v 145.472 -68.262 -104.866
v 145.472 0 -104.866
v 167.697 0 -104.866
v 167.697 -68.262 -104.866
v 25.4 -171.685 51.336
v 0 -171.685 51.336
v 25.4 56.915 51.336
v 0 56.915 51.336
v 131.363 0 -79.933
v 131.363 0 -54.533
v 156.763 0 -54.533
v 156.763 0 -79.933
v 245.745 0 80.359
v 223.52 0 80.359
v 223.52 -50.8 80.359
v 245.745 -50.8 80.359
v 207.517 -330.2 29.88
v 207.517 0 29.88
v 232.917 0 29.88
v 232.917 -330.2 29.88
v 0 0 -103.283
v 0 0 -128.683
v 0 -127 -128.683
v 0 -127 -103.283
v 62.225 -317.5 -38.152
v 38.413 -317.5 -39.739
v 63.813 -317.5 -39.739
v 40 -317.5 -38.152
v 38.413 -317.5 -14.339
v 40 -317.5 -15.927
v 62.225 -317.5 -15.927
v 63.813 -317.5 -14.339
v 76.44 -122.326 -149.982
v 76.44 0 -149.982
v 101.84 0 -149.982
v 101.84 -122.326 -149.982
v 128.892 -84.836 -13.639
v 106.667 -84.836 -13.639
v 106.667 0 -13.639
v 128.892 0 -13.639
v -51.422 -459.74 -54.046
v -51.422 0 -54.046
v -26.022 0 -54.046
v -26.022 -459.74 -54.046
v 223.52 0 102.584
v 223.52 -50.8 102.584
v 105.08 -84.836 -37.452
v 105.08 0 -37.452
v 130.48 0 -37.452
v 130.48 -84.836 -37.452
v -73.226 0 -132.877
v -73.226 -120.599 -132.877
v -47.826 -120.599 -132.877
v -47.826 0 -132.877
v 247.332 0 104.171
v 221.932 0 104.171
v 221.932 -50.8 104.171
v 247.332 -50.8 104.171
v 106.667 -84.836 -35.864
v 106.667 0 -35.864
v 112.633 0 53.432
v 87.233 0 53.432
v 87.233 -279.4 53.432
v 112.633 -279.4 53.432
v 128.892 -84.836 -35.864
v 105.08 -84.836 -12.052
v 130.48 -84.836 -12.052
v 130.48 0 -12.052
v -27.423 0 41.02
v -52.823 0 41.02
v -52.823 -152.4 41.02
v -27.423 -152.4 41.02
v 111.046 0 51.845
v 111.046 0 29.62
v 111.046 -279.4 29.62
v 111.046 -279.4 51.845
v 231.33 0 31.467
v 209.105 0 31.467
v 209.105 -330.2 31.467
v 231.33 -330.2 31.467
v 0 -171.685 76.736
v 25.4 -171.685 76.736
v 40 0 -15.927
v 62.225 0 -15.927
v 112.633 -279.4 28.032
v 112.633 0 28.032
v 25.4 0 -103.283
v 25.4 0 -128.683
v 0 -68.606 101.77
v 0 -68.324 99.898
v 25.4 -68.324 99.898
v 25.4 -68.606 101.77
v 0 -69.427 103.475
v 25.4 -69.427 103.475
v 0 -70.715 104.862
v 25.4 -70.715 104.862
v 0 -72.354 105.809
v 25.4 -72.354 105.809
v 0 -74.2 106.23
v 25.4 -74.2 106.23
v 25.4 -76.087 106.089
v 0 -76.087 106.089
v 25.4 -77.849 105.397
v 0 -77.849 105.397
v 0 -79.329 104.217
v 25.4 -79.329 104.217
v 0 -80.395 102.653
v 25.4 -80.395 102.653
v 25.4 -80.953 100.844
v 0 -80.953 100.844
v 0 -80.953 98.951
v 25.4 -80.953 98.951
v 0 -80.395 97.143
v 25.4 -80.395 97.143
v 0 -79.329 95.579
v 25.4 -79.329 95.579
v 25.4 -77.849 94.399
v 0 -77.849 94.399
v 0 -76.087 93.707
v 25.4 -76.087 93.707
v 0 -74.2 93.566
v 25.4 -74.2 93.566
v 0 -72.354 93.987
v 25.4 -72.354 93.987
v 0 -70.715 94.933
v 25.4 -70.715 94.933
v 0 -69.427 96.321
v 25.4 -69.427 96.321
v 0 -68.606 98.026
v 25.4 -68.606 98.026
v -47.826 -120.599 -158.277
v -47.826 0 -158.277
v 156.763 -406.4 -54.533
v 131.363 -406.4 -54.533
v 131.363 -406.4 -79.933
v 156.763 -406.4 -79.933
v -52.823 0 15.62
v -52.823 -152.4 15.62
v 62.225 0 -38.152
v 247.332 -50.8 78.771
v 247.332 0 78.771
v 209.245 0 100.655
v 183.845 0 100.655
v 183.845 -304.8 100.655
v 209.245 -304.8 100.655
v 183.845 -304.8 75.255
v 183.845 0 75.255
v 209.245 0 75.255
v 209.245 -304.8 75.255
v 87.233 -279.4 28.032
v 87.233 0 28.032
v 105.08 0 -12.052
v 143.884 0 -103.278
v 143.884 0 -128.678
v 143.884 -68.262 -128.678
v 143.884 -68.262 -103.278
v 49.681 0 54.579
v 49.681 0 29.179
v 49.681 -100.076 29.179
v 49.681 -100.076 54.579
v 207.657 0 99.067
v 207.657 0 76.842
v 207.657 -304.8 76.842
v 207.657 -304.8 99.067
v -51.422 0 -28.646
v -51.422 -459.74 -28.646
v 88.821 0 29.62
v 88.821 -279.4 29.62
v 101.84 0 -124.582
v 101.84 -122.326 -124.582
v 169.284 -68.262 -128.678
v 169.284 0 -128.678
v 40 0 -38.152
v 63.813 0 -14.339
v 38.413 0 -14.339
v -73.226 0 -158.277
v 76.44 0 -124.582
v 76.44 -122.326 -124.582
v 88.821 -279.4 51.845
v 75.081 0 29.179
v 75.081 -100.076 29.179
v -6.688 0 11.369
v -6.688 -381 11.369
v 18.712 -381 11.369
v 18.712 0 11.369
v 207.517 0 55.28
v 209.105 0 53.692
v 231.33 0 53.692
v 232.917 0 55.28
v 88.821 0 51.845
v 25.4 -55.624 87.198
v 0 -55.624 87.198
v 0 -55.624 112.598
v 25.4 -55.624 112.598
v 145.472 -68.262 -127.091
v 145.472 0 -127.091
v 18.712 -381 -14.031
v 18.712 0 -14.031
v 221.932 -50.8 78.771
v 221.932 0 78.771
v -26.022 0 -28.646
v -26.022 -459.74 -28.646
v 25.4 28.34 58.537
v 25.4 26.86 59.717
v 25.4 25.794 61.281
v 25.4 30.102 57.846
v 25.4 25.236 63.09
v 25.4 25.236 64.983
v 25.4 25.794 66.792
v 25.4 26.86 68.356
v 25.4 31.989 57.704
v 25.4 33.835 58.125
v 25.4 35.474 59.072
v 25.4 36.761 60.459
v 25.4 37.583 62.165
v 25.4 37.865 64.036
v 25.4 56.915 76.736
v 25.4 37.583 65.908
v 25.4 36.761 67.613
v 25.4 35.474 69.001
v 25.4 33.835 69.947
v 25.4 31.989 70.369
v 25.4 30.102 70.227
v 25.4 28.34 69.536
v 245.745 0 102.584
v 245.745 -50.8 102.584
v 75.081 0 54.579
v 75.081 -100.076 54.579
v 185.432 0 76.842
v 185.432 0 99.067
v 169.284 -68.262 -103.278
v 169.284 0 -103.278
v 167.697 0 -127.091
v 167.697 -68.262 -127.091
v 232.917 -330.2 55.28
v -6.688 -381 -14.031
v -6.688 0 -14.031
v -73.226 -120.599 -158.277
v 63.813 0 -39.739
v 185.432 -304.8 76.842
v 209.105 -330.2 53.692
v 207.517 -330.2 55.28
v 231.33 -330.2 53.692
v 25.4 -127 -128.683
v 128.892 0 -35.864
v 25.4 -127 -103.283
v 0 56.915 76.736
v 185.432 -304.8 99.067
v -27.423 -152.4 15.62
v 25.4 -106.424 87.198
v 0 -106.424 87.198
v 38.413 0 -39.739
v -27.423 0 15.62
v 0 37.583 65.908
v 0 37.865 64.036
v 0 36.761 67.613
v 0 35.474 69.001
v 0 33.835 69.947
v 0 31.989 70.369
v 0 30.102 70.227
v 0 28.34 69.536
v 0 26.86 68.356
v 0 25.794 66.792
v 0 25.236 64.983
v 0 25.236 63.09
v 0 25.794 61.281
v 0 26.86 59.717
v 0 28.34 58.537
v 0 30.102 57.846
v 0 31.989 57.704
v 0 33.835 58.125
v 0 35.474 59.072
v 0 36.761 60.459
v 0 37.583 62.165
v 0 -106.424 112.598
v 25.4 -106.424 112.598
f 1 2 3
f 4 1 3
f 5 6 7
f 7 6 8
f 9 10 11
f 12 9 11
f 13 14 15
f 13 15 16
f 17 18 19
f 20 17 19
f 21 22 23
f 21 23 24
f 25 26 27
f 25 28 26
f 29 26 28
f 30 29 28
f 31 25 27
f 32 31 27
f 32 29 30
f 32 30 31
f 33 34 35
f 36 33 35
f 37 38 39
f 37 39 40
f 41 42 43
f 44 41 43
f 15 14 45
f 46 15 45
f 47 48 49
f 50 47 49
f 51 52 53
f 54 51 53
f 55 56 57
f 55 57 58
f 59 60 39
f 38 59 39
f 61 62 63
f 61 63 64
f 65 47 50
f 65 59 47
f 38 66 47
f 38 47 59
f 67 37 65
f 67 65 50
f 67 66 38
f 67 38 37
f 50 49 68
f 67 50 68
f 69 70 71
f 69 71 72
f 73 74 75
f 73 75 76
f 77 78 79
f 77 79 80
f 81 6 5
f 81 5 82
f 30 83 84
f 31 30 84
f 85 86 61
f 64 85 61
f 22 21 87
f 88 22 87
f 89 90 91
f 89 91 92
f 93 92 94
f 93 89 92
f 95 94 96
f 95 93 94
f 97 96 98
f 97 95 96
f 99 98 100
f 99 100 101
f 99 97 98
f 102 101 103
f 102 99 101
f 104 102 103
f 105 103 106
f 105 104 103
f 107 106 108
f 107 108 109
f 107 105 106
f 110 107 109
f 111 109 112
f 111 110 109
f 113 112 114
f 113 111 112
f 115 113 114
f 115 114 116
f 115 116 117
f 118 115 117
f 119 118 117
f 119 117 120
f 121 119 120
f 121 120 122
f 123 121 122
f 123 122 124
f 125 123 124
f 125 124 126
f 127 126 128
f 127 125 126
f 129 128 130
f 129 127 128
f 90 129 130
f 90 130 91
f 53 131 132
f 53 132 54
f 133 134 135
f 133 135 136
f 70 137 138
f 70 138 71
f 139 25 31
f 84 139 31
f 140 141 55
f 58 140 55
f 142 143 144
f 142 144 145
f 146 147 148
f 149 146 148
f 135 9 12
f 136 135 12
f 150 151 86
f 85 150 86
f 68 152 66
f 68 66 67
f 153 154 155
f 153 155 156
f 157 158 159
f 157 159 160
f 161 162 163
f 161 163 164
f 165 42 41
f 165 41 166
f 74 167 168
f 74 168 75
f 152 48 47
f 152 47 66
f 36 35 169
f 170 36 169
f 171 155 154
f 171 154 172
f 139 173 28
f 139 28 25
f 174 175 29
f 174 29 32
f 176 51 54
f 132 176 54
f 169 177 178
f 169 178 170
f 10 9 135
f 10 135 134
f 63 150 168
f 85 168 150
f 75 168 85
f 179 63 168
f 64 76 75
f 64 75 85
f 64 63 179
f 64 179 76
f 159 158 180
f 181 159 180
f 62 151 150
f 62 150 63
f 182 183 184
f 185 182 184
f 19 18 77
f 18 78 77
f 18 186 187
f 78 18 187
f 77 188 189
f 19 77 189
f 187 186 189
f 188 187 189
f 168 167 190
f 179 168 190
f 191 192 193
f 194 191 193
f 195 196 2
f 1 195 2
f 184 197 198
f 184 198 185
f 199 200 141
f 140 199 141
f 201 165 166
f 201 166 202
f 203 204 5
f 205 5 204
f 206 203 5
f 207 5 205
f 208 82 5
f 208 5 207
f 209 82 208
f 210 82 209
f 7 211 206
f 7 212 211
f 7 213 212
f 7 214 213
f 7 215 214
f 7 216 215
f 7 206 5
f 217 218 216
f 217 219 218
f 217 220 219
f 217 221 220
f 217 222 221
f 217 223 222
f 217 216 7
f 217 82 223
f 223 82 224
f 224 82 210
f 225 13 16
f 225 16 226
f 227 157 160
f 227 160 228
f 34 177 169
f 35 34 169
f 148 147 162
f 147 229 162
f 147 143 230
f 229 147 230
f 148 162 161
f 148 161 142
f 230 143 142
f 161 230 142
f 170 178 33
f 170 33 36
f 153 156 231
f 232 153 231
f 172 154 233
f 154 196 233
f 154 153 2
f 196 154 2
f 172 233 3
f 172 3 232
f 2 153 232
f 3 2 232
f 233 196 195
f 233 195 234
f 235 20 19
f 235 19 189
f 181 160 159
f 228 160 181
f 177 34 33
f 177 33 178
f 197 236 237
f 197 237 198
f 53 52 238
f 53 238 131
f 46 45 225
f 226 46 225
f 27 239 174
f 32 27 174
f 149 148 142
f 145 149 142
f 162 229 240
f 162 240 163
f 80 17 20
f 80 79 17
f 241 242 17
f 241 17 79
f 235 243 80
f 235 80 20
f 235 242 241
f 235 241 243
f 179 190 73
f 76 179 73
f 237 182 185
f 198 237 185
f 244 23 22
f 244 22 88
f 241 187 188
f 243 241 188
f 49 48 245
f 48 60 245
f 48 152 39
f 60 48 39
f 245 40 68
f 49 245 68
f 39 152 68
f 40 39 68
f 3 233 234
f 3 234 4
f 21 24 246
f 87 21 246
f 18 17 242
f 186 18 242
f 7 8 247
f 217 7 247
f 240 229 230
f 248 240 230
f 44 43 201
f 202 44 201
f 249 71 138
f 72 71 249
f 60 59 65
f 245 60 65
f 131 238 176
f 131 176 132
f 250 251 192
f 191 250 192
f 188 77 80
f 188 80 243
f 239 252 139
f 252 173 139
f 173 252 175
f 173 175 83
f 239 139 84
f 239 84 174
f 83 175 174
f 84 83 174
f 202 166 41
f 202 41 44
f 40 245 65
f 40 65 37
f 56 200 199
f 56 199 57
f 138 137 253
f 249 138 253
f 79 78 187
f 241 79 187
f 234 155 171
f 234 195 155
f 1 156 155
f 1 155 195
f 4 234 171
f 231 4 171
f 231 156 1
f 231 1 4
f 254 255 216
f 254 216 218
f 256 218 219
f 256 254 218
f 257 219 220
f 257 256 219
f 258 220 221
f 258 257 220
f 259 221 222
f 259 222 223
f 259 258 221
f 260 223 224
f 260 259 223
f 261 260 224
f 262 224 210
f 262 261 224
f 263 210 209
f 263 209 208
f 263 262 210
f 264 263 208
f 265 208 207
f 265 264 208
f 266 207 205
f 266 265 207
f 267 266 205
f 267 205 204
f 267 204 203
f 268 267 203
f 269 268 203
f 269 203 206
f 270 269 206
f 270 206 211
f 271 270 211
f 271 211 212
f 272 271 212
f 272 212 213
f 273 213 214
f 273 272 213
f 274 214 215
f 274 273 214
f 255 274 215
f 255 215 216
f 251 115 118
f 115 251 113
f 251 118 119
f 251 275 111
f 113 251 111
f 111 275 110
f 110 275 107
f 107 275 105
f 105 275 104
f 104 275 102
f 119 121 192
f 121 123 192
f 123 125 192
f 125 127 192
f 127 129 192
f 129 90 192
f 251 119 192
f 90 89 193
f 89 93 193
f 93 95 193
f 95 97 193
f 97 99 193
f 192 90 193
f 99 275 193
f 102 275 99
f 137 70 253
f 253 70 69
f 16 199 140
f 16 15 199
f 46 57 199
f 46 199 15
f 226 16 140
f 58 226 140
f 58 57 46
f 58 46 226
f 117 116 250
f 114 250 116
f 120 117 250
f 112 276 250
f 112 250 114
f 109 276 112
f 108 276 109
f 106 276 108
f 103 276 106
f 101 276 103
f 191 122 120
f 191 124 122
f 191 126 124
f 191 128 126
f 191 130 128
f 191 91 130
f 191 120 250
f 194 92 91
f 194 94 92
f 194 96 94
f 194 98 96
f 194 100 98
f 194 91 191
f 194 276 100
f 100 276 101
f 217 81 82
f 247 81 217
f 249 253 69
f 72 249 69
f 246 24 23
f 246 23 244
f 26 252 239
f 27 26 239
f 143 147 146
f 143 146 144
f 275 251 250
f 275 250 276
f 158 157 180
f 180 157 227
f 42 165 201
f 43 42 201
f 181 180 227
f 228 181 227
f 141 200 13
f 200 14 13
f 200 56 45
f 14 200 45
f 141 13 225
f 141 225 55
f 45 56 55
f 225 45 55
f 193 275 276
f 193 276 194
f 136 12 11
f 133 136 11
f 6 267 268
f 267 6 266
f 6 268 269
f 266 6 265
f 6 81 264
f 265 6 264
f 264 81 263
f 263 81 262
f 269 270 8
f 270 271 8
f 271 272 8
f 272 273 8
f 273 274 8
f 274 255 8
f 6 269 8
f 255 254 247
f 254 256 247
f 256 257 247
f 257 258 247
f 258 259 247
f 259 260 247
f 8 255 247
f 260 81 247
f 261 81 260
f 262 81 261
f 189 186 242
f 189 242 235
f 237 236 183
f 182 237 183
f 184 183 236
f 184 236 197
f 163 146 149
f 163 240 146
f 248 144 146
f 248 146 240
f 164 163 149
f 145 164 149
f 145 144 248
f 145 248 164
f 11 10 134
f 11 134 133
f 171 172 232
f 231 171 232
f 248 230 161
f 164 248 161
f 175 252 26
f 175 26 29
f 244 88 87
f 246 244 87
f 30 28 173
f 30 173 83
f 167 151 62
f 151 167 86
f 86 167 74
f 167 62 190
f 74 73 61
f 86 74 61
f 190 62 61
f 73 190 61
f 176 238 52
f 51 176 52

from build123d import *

# Parameters (mm, degrees)
F0_W      = 25.4
F0_H      = 25.4
F1_DEPTH  = 381
F2_W      = 25.4
F2_H      = 25.4
F2_W_2    = 22.225
F2_H_2    = 22.225
F3_DEPTH  = 317.5
F4_W      = 25.4
F4_H      = 25.4
F5_DEPTH  = 152.4
F6_W      = 228.6
F6_H      = 25.4
F6_R      = 6.35
F7_DEPTH  = 25.4
F8_W      = 50.8
F8_H      = 25.4
F8_R      = 6.35
F9_DEPTH  = 25.4
F10_W     = 25.4
F10_H     = 25.4
F11_DEPTH = 459.74
F12_W     = 25.4
F12_H     = 25.4
F13_DEPTH = 100.076
F14_W     = 25.4
F14_H     = 25.4
F15_DEPTH = 122.3264
F16_W     = 25.4
F16_H     = 25.4
F17_DEPTH = 120.5992
F18_W     = 25.4
F18_H     = 25.4
F19_DEPTH = 127
F20_W     = 25.4
F20_H     = 25.4
F21_DEPTH = 406.4
F22_W     = 25.4
F22_H     = 25.4
F22_W_2   = 22.225
F22_H_2   = 22.225
F23_DEPTH = 279.4
F24_W     = 25.4
F24_H     = 25.4
F24_W_2   = 22.225
F24_H_2   = 22.225
F25_DEPTH = 304.8
F26_W     = 25.4
F26_H     = 25.4
F26_W_2   = 22.225
F26_H_2   = 22.225
F27_DEPTH = 50.8
F28_W     = 25.4
F28_H     = 25.4
F28_W_2   = 22.225
F28_H_2   = 22.225
F29_DEPTH = 330.2
F30_W     = 25.4
F30_H     = 25.4
F30_W_2   = 22.225
F30_H_2   = 22.225
F31_DEPTH = 84.836
F32_W     = 25.4
F32_H     = 25.4
F32_W_2   = 22.225
F32_H_2   = 22.225
F33_DEPTH = 68.2625


with BuildPart() as f1:
    # F0 (on Front) → F1 (new body)
    with BuildSketch(Plane.XZ):
        with Locations((6.012416, -1.331083)):
            Rectangle(F0_W, F0_H)
    extrude(amount=F1_DEPTH)


with BuildPart() as f3:
    # F2 (on Front) → F3 (new body)
    with BuildSketch(Plane.XZ):
        with Locations((51.112667, -27.039096)):
            Rectangle(F2_W, F2_H)
        with Locations((51.112667, -27.039096)):
            Rectangle(F2_W_2, F2_H_2, mode=Mode.SUBTRACT)
    extrude(amount=F3_DEPTH)


with BuildPart() as f5:
    # F4 (on Front) → F5 (new body)
    with BuildSketch(Plane.XZ):
        with Locations((-40.122539, 28.319776)):
            Rectangle(F4_W, F4_H)
    extrude(amount=F5_DEPTH)


with BuildPart() as f7:
    # F6 (on Right) → F7 (new body)
    with BuildSketch(Plane.YZ):
        with Locations((-57.385214, 64.036405)):
            Rectangle(F6_W, F6_H)
        with Locations((31.514786, 64.036405)):
            Circle(F6_R, mode=Mode.SUBTRACT)
    extrude(amount=F7_DEPTH)


with BuildPart() as f9:
    # F8 (on Right) → F9 (new body)
    with BuildSketch(Plane.YZ):
        with Locations((-81.024057, 99.897847)):
            Rectangle(F8_W, F8_H)
        with Locations((-74.674057, 99.897847)):
            Circle(F8_R, mode=Mode.SUBTRACT)
    extrude(amount=F9_DEPTH)


with BuildPart() as f11:
    # F10 (on Front) → F11 (new body)
    with BuildSketch(Plane.XZ):
        with Locations((-38.722203, -41.346163)):
            Rectangle(F10_W, F10_H)
    extrude(amount=F11_DEPTH)


with BuildPart() as f13:
    # F12 (on Front) → F13 (new body)
    with BuildSketch(Plane.XZ):
        with Locations((62.380522, 41.878674)):
            Rectangle(F12_W, F12_H)
    extrude(amount=F13_DEPTH)


with BuildPart() as f15:
    # F14 (on Front) → F15 (new body)
    with BuildSketch(Plane.XZ):
        with Locations((89.140385, -137.282215)):
            Rectangle(F14_W, F14_H)
    extrude(amount=F15_DEPTH)


with BuildPart() as f17:
    # F16 (on Front) → F17 (new body)
    with BuildSketch(Plane.XZ):
        with Locations((-60.525931, -145.576701)):
            Rectangle(F16_W, F16_H)
    extrude(amount=F17_DEPTH)


with BuildPart() as f19:
    # F18 (on Front) → F19 (new body)
    with BuildSketch(Plane.XZ):
        with Locations((12.7, -115.983012)):
            Rectangle(F18_W, F18_H)
    extrude(amount=F19_DEPTH)


with BuildPart() as f21:
    # F20 (on Front) → F21 (new body)
    with BuildSketch(Plane.XZ):
        with Locations((144.062687, -67.233101)):
            Rectangle(F20_W, F20_H)
    extrude(amount=F21_DEPTH)


with BuildPart() as f23:
    # F22 (on Front) → F23 (new body)
    with BuildSketch(Plane.XZ):
        with Locations((99.933479, 40.732481)):
            Rectangle(F22_W, F22_H)
        with Locations((99.933479, 40.732481)):
            Rectangle(F22_W_2, F22_H_2, mode=Mode.SUBTRACT)
    extrude(amount=F23_DEPTH)


with BuildPart() as f25:
    # F24 (on Front) → F25 (new body)
    with BuildSketch(Plane.XZ):
        with Locations((196.544535, 87.954864)):
            Rectangle(F24_W, F24_H)
        with Locations((196.544535, 87.954864)):
            Rectangle(F24_W_2, F24_H_2, mode=Mode.SUBTRACT)
    extrude(amount=F25_DEPTH)


with BuildPart() as f27:
    # F26 (on Front) → F27 (new body)
    with BuildSketch(Plane.XZ):
        with Locations((234.632495, 91.471016)):
            Rectangle(F26_W, F26_H)
        with Locations((234.632495, 91.471016)):
            Rectangle(F26_W_2, F26_H_2, mode=Mode.SUBTRACT)
    extrude(amount=F27_DEPTH)


with BuildPart() as f29:
    # F28 (on Front) → F29 (new body)
    with BuildSketch(Plane.XZ):
        with Locations((220.217026, 42.579796)):
            Rectangle(F28_W, F28_H)
        with Locations((220.217026, 42.579796)):
            Rectangle(F28_W_2, F28_H_2, mode=Mode.SUBTRACT)
    extrude(amount=F29_DEPTH)


with BuildPart() as f31:
    # F30 (on Front) → F31 (new body)
    with BuildSketch(Plane.XZ):
        with Locations((117.779925, -24.751918)):
            Rectangle(F30_W, F30_H)
        with Locations((117.779925, -24.751918)):
            Rectangle(F30_W_2, F30_H_2, mode=Mode.SUBTRACT)
    extrude(amount=F31_DEPTH)


with BuildPart() as f33:
    # F32 (on Front) → F33 (new body)
    with BuildSketch(Plane.XZ):
        with Locations((156.584144, -115.978435)):
            Rectangle(F32_W, F32_H)
        with Locations((156.584144, -115.978435)):
            Rectangle(F32_W_2, F32_H_2, mode=Mode.SUBTRACT)
    extrude(amount=F33_DEPTH)


solid = Compound([f1.part, f3.part, f5.part, f7.part, f9.part, f11.part, f13.part, f15.part, f17.part, f19.part, f21.part, f23.part, f25.part, f27.part, f29.part, f31.part, f33.part])
